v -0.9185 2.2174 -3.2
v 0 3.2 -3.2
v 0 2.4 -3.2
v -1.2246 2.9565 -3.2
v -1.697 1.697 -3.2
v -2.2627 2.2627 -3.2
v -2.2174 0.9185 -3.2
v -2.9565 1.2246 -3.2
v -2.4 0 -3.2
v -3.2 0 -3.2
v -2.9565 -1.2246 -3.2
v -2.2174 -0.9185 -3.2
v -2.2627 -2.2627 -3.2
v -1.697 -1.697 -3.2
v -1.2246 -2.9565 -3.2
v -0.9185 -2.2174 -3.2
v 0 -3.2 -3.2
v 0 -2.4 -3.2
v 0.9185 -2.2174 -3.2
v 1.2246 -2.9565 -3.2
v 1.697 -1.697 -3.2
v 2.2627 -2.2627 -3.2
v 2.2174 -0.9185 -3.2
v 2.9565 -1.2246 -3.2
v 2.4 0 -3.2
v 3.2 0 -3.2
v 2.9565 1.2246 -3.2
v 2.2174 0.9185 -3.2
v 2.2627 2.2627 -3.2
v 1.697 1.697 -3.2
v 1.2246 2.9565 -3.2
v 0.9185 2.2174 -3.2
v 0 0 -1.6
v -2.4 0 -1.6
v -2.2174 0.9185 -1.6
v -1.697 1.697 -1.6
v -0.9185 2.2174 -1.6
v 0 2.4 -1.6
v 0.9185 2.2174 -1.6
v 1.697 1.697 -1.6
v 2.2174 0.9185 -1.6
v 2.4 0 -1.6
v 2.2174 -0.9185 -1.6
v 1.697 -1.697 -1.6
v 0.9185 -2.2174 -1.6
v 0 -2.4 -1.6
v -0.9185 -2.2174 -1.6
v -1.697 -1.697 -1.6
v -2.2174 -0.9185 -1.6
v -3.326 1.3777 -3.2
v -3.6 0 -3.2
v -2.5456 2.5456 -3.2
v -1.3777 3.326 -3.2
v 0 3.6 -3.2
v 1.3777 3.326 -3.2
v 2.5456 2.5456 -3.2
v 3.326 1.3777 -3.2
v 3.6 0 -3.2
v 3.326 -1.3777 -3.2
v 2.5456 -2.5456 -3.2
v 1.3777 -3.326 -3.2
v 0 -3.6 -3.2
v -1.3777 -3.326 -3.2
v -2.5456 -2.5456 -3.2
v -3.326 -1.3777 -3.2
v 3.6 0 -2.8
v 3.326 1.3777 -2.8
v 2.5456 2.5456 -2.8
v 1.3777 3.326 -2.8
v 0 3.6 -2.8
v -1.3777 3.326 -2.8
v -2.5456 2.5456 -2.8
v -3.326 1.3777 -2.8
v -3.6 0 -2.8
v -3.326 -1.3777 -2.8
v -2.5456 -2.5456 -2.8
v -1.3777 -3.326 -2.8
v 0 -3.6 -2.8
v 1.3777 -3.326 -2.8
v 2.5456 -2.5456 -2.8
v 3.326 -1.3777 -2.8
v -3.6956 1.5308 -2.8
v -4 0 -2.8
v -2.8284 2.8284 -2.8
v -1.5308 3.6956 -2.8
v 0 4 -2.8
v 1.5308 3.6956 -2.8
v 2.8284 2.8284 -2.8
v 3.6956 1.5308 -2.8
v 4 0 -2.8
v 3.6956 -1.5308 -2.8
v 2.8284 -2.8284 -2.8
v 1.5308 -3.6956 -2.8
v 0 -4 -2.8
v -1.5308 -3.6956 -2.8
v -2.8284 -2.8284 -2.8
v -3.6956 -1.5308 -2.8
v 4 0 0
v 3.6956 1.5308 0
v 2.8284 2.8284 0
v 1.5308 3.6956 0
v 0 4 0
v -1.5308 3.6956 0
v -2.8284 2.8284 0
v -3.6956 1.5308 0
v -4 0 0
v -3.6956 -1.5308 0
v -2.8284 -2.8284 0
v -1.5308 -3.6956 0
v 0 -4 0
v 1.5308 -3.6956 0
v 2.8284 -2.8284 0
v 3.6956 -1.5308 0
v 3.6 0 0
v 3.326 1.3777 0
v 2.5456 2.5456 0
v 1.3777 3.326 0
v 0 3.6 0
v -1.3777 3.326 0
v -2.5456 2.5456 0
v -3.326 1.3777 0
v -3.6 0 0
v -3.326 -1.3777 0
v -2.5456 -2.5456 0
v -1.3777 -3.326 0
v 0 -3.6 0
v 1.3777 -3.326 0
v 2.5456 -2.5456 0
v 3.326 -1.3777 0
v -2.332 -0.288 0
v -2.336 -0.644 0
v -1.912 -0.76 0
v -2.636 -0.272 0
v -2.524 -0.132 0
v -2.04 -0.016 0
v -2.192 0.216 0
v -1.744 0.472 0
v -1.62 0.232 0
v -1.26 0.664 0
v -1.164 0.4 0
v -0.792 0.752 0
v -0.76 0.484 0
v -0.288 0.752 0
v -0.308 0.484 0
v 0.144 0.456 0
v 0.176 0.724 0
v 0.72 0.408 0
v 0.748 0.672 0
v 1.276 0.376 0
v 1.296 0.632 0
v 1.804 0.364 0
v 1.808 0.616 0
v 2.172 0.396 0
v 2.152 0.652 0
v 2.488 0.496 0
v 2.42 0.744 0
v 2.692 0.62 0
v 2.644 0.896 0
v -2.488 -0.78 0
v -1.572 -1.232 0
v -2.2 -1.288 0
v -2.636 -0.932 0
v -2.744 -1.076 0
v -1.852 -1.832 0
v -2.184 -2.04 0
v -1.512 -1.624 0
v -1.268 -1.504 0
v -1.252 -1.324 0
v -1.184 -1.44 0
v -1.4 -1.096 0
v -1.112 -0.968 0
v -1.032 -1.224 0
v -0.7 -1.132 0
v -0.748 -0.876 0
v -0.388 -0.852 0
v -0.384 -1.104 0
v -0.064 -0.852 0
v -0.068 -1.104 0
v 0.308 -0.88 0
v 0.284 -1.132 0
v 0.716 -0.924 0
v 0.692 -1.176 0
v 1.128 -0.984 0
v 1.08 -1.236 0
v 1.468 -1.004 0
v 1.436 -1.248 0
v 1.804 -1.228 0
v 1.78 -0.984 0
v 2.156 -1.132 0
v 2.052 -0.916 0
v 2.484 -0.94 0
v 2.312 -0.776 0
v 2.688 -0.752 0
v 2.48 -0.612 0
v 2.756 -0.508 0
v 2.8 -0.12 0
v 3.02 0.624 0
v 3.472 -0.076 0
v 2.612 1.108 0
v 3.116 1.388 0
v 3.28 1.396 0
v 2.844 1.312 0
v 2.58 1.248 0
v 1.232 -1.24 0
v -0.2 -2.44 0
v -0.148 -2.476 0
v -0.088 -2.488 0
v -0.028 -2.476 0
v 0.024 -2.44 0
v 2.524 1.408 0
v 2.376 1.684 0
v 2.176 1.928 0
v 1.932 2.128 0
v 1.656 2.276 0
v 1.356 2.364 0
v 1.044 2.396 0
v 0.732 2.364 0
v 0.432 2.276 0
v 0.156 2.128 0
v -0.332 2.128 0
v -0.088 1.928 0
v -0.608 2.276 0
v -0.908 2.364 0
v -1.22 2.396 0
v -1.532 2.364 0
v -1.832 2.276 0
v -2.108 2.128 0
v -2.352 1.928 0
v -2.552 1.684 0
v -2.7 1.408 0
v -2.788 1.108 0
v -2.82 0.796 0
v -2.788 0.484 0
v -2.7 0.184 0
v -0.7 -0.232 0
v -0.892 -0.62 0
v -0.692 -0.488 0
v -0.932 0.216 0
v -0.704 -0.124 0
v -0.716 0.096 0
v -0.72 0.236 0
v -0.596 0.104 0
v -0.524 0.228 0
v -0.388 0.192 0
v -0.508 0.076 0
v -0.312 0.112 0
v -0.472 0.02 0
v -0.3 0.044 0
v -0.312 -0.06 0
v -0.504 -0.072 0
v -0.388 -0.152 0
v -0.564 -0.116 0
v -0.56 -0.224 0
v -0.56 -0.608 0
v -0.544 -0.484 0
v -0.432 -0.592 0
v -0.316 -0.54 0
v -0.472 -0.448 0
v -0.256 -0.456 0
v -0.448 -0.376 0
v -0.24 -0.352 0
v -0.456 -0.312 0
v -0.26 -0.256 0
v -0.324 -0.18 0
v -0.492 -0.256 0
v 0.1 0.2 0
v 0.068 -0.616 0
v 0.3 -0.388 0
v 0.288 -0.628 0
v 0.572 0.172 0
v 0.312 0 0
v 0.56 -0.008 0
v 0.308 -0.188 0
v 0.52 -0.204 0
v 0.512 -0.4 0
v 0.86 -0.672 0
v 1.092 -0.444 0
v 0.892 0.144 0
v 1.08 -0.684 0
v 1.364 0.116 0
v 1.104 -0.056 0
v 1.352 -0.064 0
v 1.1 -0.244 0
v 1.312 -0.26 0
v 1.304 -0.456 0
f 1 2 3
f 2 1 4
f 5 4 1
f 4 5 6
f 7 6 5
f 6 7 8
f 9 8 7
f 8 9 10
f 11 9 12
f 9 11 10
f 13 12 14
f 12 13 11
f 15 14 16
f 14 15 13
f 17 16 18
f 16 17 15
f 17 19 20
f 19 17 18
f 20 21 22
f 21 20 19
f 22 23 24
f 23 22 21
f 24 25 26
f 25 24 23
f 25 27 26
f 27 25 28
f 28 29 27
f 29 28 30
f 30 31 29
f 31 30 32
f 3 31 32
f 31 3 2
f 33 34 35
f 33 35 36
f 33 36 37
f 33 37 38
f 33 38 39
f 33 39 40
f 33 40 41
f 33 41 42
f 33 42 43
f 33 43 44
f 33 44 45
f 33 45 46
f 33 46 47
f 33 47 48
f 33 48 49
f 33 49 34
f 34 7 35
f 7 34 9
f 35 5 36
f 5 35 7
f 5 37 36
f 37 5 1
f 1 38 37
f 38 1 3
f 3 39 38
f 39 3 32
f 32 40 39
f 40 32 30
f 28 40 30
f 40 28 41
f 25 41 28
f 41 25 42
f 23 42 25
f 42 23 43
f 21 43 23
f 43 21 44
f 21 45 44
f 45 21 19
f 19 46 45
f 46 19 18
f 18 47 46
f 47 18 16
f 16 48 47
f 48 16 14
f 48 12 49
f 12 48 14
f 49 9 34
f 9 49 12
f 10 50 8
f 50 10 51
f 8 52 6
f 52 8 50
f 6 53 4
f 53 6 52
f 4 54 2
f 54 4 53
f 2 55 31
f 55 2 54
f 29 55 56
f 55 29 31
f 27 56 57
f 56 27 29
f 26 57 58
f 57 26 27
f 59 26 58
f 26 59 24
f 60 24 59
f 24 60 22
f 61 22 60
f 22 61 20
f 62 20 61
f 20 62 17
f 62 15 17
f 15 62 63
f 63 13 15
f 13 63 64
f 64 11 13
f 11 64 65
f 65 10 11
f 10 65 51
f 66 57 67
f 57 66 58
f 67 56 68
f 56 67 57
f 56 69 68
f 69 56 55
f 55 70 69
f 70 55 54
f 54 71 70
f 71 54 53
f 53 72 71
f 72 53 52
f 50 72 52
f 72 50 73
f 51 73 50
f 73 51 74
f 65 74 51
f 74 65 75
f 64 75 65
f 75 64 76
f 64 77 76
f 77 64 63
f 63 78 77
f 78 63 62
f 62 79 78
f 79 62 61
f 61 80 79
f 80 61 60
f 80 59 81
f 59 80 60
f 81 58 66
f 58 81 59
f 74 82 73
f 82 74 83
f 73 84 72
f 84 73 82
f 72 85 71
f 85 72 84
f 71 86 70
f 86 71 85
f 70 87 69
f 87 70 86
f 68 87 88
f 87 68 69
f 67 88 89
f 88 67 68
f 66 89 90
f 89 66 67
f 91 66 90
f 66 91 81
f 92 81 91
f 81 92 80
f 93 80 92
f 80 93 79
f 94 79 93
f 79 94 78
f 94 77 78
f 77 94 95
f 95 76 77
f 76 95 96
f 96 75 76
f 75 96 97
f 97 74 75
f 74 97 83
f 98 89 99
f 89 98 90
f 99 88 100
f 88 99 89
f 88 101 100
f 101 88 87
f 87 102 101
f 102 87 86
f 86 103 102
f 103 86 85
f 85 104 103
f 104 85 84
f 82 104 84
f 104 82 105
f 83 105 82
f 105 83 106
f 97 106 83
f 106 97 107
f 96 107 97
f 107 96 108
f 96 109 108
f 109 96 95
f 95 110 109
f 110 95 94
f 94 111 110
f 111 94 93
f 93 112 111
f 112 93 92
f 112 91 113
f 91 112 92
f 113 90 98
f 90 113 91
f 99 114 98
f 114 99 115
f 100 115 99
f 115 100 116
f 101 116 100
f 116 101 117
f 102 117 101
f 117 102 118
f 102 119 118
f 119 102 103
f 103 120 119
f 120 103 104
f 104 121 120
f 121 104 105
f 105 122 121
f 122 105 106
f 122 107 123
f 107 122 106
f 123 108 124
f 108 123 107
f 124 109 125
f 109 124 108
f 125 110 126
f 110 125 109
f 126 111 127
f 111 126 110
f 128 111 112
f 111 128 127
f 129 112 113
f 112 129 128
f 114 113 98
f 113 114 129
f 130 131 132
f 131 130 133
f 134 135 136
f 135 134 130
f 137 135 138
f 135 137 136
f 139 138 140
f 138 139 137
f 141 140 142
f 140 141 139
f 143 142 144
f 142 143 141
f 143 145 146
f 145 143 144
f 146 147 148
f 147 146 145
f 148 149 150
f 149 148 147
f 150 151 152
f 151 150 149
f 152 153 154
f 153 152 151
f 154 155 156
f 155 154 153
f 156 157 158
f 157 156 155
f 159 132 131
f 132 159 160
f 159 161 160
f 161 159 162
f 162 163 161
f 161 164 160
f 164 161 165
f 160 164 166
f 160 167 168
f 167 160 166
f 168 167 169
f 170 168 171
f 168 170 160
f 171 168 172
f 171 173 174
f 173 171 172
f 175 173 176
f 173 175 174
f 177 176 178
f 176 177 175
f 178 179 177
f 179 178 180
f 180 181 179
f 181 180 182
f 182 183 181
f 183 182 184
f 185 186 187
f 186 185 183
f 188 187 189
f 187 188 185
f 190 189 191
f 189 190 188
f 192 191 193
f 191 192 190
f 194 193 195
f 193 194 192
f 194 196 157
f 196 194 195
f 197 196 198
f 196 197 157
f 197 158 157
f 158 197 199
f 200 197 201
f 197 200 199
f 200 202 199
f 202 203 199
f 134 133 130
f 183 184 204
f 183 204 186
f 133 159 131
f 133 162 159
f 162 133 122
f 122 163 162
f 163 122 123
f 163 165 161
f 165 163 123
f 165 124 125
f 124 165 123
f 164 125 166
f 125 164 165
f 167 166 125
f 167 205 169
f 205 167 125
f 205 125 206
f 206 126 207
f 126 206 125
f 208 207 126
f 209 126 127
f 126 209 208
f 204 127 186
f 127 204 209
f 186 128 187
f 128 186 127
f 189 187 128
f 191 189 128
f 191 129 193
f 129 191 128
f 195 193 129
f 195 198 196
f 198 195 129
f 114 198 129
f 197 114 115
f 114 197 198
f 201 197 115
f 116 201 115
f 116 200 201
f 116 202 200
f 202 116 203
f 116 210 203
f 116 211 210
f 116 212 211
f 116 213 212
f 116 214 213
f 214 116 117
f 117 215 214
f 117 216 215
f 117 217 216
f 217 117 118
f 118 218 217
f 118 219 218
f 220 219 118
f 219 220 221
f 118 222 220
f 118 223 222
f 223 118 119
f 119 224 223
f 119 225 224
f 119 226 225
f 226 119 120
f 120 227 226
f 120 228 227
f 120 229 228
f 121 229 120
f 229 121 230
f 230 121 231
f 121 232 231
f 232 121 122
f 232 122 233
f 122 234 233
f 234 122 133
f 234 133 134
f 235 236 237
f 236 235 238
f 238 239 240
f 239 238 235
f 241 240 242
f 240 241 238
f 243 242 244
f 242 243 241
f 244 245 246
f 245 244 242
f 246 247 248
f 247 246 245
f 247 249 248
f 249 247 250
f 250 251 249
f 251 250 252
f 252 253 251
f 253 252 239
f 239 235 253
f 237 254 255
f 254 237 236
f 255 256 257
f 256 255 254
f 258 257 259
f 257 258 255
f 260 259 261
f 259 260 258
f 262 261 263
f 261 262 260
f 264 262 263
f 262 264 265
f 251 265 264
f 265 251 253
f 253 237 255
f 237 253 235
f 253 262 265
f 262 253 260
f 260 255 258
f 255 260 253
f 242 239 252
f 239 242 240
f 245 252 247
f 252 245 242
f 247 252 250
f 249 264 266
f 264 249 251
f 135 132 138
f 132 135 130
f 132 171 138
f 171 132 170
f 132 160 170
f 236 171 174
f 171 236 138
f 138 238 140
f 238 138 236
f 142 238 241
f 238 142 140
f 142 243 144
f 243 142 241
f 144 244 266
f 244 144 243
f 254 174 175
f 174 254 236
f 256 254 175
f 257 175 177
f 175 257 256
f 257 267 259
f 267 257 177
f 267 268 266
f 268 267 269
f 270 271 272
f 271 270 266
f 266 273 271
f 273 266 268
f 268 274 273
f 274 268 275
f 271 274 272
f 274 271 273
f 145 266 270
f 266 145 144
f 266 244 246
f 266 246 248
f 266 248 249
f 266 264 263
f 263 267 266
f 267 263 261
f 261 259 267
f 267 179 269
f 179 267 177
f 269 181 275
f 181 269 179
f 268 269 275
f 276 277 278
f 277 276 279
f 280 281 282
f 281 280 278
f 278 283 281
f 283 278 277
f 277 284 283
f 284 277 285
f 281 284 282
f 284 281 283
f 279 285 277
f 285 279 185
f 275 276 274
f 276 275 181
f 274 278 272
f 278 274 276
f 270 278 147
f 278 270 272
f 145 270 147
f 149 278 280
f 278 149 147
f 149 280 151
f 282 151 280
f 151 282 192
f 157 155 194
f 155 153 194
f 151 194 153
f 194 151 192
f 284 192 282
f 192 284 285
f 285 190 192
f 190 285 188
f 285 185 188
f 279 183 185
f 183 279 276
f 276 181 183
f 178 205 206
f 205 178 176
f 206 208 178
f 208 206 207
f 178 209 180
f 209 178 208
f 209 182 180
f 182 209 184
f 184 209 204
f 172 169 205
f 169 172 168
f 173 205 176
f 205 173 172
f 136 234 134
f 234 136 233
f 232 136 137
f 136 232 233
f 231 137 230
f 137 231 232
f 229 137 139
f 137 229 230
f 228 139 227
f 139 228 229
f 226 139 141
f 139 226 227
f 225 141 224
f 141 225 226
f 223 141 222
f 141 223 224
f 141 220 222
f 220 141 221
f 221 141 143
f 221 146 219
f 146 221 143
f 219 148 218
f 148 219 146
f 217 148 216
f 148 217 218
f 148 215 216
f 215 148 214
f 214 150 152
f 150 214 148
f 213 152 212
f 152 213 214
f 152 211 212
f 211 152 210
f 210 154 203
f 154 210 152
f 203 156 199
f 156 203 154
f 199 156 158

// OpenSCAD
use <../lib.scad>
use <s/98138p1ds01.scad>
use <s/98138p1ds02.scad>
function ldraw_lib__98138p1g() = [
// 0 Tile  1 x  1 Round with Lavender Heart and Medium Lilac Banner with "BFF" Pattern
// 0 Name: 98138p1g.dat
// 0 Author: Gerald Lasser [GeraldLasser]
// 0 !LDRAW_ORG Part UPDATE 2022-03
// 0 !LICENSE Licensed under CC BY 4.0 : see CAreadme.txt
// 
// 0 BFC CERTIFY CCW
  [0,"BFC","CERTIFY"],
  [0,"BFC","CCW"],
// 
// 0 !KEYWORDS Best Friends Forever, Bricklink 98138pb150, Dots, Mega Pack
// 0 !KEYWORDS Rebrickable 98138pr0165, Set 41913
// 
// 0 !HISTORY 2021-06-14 [RainbowDolphin] Subfiled patterns for colour variants
// 0 !HISTORY 2022-05-07 [PTadmin] Official Update 2022-03
// 
// 
// 1 16 0 0 0 1 0 0 0 1 0 0 0 1 s\98138p1ds01.dat
  [1,16,0,0,0,1,0,0,0,1,0,0,0,1, ldraw_lib__s__98138p1ds01()],
// 1 31 0 0 0 1 0 0 0 1 0 0 0 1 s\98138p1ds02.dat
  [1,31,0,0,0,1,0,0,0,1,0,0,0,1, ldraw_lib__s__98138p1ds02()],
];
module ldraw_lib__98138p1g(step=0, col=false, unit=2/5, alt=false, line=0.2, solid=!$preview)
    makepoly(ldraw_lib__98138p1g(), step=step, col=col, unit=unit, alt=alt, line=line, solid=solid);
ldraw_lib__98138p1g(line=0.2);
